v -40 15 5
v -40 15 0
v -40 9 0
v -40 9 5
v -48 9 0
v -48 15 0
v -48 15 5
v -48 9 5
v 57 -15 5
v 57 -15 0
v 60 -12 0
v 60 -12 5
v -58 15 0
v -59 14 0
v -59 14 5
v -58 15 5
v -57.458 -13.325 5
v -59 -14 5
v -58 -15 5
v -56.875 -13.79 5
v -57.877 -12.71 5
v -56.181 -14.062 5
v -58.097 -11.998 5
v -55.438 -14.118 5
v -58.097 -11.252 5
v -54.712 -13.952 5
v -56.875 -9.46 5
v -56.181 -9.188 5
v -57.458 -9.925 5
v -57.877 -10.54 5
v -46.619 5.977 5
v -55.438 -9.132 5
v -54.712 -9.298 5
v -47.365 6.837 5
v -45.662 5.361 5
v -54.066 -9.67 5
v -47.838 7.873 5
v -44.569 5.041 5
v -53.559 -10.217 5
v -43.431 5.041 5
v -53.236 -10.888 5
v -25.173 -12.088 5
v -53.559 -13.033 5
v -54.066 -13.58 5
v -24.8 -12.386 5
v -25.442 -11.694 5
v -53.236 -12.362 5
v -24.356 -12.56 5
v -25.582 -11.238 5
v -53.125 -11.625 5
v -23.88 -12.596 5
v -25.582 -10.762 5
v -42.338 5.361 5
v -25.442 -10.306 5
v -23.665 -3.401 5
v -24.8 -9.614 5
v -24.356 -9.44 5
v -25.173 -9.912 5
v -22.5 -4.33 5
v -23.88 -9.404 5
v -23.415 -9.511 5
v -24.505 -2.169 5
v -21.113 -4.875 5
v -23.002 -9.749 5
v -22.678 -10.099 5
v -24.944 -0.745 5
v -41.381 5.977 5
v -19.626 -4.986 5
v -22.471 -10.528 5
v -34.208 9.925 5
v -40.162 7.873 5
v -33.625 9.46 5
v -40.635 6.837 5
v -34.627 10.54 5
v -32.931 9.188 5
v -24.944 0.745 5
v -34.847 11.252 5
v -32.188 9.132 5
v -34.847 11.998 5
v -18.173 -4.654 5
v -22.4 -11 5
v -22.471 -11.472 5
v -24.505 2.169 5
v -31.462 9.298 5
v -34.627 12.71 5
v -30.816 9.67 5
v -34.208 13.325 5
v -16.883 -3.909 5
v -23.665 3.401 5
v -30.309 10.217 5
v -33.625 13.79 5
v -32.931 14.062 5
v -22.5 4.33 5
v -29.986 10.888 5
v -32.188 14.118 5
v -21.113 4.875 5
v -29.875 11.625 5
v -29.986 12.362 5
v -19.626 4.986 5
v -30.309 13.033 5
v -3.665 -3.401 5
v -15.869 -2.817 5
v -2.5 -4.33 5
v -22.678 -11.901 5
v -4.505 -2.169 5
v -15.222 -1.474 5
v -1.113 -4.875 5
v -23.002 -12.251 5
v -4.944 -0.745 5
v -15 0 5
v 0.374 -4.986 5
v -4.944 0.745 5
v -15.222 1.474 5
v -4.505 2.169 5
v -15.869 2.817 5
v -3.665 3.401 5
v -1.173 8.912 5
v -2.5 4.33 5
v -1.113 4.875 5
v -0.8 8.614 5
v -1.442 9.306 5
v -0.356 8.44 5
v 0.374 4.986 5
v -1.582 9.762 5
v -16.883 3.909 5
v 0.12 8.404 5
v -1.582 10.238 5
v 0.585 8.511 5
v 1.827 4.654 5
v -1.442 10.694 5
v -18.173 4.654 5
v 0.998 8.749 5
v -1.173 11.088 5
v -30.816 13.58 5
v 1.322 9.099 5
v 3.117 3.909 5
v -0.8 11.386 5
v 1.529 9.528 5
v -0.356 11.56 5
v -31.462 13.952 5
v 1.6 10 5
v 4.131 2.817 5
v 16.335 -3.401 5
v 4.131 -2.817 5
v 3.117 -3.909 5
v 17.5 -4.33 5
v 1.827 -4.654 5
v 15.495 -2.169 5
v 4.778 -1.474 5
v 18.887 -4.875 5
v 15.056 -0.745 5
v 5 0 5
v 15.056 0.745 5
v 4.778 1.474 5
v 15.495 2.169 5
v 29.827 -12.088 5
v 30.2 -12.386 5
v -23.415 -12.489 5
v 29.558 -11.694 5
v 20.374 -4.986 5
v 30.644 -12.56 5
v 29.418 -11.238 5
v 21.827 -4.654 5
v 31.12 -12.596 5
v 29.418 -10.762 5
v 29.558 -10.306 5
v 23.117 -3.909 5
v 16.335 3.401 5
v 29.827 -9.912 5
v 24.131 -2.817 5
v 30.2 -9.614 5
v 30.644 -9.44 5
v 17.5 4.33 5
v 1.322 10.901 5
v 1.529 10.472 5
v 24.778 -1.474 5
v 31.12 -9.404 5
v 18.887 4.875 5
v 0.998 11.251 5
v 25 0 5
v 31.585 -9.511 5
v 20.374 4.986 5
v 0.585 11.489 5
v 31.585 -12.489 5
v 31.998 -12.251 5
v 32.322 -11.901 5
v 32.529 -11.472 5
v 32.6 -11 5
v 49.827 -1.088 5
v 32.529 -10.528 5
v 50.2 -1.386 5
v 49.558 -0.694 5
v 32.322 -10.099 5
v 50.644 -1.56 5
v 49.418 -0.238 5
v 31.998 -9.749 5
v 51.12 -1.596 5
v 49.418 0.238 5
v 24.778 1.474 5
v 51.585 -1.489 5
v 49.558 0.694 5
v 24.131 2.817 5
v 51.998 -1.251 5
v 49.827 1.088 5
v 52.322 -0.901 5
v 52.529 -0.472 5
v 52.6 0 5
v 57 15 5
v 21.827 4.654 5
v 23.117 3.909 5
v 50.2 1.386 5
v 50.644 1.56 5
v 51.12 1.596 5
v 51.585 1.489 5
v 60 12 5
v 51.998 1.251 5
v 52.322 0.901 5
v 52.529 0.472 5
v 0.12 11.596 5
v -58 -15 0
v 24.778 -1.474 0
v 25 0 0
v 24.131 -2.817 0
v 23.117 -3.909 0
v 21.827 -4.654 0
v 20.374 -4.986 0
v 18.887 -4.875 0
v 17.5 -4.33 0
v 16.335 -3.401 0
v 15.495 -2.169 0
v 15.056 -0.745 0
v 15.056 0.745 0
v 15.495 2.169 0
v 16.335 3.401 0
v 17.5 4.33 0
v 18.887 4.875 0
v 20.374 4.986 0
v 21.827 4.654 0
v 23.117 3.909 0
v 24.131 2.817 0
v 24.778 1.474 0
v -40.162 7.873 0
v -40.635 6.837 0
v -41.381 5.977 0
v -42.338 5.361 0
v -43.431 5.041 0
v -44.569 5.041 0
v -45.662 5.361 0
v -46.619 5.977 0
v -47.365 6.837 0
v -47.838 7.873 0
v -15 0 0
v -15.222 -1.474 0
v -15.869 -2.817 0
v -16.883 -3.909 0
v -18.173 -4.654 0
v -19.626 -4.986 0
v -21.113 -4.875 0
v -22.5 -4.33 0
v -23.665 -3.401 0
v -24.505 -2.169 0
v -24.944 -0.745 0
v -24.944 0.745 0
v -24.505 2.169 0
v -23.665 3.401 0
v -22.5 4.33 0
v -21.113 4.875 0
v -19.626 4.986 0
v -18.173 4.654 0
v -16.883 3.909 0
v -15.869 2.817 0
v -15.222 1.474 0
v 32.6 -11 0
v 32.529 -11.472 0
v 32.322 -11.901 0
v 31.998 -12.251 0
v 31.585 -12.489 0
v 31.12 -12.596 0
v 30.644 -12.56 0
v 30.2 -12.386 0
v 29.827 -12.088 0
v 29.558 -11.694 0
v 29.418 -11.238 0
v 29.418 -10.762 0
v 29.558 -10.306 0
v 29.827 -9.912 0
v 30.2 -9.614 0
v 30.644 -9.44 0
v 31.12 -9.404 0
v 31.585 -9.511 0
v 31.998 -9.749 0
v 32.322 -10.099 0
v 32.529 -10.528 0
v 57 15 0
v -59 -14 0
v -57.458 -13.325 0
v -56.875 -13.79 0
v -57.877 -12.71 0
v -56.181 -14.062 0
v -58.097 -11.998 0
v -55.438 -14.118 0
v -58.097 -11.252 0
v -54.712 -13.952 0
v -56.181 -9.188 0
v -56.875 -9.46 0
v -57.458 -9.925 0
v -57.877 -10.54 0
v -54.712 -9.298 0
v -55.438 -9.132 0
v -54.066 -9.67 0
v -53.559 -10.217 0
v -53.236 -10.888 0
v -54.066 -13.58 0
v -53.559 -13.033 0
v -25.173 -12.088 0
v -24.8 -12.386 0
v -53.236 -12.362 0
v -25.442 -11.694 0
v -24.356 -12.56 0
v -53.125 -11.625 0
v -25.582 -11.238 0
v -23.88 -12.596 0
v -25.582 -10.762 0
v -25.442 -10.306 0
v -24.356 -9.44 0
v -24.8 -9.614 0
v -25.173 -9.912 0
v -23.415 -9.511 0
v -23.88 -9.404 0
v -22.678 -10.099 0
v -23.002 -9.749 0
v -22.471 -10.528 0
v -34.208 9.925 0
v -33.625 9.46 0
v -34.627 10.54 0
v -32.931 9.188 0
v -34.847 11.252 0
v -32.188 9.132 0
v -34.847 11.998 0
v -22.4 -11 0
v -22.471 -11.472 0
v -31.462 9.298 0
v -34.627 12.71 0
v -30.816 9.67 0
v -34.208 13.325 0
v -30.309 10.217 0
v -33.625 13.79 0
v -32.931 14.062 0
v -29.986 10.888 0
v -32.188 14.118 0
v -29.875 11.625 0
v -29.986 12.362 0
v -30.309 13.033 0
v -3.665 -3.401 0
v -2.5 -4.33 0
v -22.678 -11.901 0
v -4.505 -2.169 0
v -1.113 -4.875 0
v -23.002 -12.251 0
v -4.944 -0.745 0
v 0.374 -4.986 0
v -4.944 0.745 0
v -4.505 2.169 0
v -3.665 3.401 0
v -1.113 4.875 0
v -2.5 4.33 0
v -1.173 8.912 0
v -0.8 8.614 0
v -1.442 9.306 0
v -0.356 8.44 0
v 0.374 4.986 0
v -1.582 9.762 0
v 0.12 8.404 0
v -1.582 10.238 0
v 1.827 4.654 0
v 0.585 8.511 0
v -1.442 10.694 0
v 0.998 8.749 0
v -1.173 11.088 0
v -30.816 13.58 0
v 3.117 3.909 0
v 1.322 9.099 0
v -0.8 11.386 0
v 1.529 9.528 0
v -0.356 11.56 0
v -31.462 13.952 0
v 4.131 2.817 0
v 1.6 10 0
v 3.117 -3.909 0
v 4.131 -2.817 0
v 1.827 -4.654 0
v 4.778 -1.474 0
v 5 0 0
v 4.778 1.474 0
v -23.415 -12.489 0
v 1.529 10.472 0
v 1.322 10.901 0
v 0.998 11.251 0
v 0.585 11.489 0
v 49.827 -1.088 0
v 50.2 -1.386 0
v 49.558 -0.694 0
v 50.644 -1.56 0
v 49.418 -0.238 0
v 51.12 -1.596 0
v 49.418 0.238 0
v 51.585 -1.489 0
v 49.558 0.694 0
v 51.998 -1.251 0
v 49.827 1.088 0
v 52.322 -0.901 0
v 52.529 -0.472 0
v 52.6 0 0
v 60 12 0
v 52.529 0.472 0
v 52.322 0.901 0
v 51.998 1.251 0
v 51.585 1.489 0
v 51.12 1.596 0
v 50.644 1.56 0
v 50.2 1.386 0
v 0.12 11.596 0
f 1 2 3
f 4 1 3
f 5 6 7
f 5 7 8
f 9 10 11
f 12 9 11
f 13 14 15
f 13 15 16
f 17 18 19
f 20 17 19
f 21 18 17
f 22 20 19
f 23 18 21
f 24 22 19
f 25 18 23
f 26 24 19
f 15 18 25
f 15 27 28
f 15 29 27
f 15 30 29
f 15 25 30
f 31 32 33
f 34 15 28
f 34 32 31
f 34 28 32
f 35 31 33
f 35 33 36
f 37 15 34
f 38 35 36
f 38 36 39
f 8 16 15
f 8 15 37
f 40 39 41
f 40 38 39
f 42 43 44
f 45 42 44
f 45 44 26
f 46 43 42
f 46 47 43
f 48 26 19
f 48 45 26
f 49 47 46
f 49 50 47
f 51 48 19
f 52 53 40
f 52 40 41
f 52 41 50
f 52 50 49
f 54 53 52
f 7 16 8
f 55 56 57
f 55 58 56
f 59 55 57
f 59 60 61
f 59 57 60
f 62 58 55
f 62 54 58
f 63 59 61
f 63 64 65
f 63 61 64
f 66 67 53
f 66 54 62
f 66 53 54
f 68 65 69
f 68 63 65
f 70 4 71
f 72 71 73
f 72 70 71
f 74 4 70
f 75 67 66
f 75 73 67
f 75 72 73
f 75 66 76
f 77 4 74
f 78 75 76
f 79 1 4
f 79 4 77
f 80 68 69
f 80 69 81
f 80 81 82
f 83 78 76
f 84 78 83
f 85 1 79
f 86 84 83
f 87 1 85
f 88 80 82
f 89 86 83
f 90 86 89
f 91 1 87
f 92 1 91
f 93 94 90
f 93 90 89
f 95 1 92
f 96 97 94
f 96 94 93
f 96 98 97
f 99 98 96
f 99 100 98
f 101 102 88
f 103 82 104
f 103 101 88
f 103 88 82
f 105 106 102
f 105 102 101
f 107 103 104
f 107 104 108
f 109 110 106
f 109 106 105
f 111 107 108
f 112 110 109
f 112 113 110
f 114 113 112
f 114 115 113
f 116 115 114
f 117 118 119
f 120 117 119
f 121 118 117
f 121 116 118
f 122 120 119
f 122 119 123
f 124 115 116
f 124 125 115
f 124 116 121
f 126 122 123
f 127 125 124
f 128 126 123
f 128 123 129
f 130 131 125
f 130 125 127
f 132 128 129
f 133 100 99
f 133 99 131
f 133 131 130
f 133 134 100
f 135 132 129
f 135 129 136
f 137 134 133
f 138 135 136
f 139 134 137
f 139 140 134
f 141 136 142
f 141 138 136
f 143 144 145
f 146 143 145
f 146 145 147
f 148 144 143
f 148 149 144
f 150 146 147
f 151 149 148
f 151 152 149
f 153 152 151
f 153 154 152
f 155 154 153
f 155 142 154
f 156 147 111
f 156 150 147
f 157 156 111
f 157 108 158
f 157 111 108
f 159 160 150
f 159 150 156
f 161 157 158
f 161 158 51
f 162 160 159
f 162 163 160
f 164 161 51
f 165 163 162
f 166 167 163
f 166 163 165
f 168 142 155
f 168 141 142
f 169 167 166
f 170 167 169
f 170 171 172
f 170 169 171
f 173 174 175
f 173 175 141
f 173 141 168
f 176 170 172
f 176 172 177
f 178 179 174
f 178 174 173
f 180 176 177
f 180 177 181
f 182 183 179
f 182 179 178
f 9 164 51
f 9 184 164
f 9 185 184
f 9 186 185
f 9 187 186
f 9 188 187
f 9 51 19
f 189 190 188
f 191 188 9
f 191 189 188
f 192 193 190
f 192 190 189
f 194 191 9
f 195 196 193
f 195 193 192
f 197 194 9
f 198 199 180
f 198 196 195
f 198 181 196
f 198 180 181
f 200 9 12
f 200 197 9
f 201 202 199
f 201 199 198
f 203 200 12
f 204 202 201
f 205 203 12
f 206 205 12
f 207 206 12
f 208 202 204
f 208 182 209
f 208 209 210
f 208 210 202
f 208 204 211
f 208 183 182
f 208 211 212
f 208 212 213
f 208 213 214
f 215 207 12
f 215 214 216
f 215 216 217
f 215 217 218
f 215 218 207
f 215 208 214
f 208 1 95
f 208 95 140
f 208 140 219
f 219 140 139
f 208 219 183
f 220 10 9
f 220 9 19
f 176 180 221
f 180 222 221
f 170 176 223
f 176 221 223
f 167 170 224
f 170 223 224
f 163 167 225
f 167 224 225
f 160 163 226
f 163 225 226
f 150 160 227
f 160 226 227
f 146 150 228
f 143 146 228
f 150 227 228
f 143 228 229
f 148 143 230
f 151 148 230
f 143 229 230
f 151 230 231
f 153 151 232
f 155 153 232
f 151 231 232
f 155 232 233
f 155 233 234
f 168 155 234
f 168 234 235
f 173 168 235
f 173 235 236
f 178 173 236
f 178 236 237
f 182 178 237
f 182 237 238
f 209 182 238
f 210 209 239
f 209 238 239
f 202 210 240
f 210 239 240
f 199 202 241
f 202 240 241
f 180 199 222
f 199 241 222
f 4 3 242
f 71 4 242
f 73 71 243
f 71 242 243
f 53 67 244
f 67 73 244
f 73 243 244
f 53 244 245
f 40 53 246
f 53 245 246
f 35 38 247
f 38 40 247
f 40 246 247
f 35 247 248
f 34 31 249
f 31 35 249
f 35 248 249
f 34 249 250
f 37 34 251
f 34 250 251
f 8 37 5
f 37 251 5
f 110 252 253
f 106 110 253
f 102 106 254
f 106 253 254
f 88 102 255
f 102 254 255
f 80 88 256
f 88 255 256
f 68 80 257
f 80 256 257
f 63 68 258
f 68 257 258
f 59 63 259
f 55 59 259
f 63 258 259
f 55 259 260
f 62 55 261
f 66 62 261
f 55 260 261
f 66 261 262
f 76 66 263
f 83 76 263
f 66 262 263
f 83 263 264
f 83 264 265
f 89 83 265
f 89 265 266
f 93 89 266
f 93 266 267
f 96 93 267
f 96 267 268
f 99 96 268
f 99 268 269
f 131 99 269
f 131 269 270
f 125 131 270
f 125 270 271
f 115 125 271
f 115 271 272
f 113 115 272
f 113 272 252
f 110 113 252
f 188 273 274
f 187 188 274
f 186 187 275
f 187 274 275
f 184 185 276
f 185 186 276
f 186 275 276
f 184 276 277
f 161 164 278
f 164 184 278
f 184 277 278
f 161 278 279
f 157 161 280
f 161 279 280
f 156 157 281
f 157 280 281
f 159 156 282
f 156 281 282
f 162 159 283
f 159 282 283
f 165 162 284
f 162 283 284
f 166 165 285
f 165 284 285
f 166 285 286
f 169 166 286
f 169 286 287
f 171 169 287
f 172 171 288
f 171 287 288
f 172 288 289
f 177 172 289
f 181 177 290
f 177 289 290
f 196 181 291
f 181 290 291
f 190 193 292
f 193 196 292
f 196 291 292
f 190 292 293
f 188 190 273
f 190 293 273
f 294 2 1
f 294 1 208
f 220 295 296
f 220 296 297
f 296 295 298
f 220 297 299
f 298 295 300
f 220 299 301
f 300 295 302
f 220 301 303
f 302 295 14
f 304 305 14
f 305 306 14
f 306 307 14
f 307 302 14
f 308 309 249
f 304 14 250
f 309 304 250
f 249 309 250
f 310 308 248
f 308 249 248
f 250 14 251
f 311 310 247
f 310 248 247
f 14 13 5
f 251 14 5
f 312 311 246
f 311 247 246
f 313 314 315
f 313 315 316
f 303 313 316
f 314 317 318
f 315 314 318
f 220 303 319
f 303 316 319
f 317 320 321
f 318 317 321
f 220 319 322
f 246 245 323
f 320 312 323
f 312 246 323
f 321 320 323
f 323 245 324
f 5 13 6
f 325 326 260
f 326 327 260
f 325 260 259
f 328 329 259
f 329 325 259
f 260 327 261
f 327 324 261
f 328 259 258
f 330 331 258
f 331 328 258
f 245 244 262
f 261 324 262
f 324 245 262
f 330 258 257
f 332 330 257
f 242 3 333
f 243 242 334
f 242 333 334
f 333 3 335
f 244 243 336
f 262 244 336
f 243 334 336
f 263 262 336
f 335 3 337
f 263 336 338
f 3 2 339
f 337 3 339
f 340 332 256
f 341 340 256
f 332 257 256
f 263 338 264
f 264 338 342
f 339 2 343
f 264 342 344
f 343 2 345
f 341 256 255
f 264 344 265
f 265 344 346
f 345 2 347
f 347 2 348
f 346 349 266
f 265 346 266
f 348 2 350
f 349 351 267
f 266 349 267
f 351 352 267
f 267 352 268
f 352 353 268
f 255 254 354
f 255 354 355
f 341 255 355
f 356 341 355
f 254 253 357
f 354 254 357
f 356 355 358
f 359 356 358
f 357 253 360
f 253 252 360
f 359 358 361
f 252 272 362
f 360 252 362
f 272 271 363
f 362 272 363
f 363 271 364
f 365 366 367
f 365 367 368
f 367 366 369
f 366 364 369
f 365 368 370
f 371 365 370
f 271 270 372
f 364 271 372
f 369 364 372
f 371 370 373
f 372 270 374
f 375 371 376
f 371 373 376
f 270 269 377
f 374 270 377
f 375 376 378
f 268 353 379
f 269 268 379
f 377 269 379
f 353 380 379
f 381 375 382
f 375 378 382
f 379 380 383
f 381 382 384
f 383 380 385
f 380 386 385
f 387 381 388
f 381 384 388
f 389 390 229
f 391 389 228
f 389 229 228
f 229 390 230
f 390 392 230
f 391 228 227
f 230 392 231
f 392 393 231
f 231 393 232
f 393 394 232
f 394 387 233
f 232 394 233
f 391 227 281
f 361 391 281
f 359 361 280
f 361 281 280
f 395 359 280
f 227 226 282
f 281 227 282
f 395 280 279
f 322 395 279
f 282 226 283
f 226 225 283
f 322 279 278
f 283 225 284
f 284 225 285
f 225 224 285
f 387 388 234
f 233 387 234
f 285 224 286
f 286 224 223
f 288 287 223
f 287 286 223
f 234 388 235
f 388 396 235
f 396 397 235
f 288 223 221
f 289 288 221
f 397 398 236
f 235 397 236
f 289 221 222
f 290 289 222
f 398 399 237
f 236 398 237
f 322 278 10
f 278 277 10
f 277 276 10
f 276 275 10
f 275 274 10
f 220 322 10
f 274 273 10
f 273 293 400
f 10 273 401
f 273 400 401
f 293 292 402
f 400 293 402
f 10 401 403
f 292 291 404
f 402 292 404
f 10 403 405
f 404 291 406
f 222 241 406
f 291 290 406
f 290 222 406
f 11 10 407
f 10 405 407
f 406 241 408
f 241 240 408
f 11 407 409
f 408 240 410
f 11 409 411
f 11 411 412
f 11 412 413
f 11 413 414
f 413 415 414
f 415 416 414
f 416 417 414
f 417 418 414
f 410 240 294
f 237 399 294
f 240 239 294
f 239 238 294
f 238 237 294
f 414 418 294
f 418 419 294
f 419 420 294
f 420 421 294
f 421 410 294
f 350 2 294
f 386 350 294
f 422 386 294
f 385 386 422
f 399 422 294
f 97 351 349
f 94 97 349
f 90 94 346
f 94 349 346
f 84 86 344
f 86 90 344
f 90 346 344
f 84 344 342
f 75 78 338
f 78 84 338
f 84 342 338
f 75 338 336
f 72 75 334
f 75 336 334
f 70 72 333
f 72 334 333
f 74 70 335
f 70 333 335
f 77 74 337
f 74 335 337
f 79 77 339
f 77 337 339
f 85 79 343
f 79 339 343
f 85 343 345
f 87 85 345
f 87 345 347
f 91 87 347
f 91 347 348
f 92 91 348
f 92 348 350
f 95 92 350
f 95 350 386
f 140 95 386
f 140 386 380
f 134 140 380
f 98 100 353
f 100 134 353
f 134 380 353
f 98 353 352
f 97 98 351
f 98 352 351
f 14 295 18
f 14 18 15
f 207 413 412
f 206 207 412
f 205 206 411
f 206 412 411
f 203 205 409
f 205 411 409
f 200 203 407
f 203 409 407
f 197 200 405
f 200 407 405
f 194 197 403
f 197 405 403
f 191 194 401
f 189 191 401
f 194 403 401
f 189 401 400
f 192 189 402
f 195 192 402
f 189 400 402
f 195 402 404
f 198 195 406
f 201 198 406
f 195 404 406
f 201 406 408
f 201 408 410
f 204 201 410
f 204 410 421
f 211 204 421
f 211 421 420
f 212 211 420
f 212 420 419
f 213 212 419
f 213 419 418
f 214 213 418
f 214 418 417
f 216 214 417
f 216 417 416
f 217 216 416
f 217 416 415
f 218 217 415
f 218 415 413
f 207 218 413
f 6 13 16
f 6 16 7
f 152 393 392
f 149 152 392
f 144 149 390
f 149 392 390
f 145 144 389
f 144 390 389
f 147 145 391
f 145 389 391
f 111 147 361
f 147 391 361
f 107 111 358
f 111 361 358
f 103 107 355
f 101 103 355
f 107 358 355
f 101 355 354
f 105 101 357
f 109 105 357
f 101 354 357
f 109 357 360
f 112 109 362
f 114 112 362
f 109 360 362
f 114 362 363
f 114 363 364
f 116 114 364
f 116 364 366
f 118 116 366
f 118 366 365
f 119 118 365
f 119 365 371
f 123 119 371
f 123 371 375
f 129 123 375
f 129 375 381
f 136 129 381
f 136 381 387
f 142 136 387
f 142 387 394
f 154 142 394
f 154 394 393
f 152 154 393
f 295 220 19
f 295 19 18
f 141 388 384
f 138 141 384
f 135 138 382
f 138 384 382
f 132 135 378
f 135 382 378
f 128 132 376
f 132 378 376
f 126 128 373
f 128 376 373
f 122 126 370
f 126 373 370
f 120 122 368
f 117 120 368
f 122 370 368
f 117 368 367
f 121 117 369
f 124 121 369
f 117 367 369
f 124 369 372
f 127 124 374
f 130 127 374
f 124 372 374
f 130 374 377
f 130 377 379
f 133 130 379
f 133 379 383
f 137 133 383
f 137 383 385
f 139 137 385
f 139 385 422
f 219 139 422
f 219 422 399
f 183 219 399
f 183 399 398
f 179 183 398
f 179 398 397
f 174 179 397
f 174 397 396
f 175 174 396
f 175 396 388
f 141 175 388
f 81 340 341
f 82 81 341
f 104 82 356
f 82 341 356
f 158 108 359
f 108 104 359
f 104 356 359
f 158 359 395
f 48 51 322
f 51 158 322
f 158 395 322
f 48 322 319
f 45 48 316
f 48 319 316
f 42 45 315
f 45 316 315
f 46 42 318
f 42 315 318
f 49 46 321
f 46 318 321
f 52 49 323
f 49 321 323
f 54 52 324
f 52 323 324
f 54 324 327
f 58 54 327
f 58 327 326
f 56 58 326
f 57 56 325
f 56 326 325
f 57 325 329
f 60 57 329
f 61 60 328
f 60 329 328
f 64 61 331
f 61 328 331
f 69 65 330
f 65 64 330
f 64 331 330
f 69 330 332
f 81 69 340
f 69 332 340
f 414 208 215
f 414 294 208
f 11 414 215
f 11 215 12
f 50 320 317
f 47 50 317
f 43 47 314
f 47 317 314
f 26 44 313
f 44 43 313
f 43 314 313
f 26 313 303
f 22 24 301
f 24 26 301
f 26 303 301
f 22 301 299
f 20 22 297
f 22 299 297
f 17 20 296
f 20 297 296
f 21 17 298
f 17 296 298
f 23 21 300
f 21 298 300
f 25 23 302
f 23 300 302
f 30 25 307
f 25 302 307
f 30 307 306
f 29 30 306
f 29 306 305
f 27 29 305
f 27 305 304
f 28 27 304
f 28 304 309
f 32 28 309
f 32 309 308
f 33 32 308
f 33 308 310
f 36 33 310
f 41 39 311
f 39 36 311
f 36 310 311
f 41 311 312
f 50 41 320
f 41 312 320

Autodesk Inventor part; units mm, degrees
ref_plane "YZ Plane" through (0, 0, 0) normal (1, 0, 0) x (0, 1, 0)
ref_plane "XZ Plane" through (0, 0, 0) normal (0, 1, 0) x (-1, 0, 0)
ref_plane "XY Plane" through (0, 0, 0) normal (0, 0, 1) x (1, 0, 0)
sketch "Náčrt1" plane through (0, 0, 0) normal (0, 0, 1) x (1, 0, 0)
  line L0 (0, -21) -> (0, 21) projected
  line L1 (-82.8, 0) -> (83.8, 0) projected
  line L2 (57, -15) -> (-58, -15)
  line L3 (-59, -14) -> (-59, 14)
  line L4 (-58, 15) -> (57, 15)
  line L5 (60, 12) -> (60, -12)
  circle A0 centre (20, 0) radius 5
  circle A1 centre (-20, 0) radius 5
  circle A2 centre (-55.625, -11.625) radius 2.5
  circle A3 centre (-32.375, 11.625) radius 2.5
  circle A4 centre (-24, -11) radius 1.6
  circle A5 centre (0, 10) radius 1.6
  circle A6 centre (51, 0) radius 1.6
  circle A7 centre (31, -11) radius 1.6
  line L6 (6, -6) -> (6, 0)
  line L7 (1, 0) -> (1, -6)
  line L8 (-3.5, -6) -> (-3.5, 0)
  line L9 (-8.5, 0) -> (-8.5, -6)
  arc A8 (1, -6) -> (6, -6) centre (3.5, -6) ccw
  arc A9 (-8.5, -6) -> (-3.5, -6) centre (-6, -6) ccw
  line L10 (-58, -15) -> (-59, -14)
  line L11 (-59, 14) -> (-58, 15)
  line L12 (57, -15) -> (60, -12)
  line L13 (57, 15) -> (60, 12)
  circle A10 centre (0, 0) radius 5
  arc A11 (6, 0) -> (4.4286, 2.3212) centre (3.5, 0) ccw
  arc A12 (1, -4.899) -> (4.4286, 2.3212) centre (0, 0) ccw
  arc A13 (-4.5625, 2.0454) -> (-8.5, 0) centre (-6, 0) ccw
  arc A14 (4.4286, 2.3212) -> (-4.5625, 2.0454) centre (0, 0) ccw
  arc A15 (-3.5, -3.5707) -> (1, -4.899) centre (0, 0) ccw
  arc A16 (-4.5625, 2.0454) -> (-3.5, -3.5707) centre (0, 0) ccw
  arc A17 (1, -4.899) -> (4.4286, 2.3212) centre (0, 0) ccw
  line L14 (1, -4.899) -> (1, -6)
  line L15 (-3.5, -3.5707) -> (-3.5, -6)
  arc A18 (-3.5, 0) -> (-4.5625, 2.0454) centre (-6, 0) ccw
  arc A19 (4.4286, 2.3212) -> (1, 0) centre (3.5, 0) ccw
  line L16 (-48, 15) -> (-48, 9)
  line L17 (-40, 15) -> (-40, 9)
  arc A20 (-48, 9) -> (-40, 9) centre (-44, 9) ccw
  line L18 (-48, 15) -> (-40, 15)
  point P0 (60, -15)
  point P1 (-59, 15)
  point P2 (-59, -15)
  point P3 (60, 15)
  dimension "d0" = 30
  dimension "d1" = 119
  dimension "d2" = 10
  dimension "d3" = 40
  dimension "d5" = 5
  dimension "d6" = 3.375
  dimension "d7" = 3.375
  dimension "d8" = 3.375
  dimension "d9" = 26.625
  dimension "d10" = 40
  dimension "d11" = 35
  dimension "d12" = 4
  dimension "d13" = 3.2
  dimension "d14" = 59
  dimension "d15" = 5
  dimension "d16" = 9
  dimension "d17" = 29
  dimension "d18" = 5
  dimension "d19" = 4.5
  dimension "d21" = 50.5
  dimension "d22" = 6.5
  dimension "d23" = 1
  dimension "d24" = 1
  dimension "d25" = 1
  dimension "d26" = 1
  dimension "d27" = 3
  dimension "d28" = 3
  dimension "d29" = 3
  dimension "d30" = 3
  dimension "d33" = 10
  dimension "d34" = 8
  dimension "d35" = 10
  dimension "d36" = 15
extrude "Vysunutí1" add sketch "Náčrt1" along normal blind 5 contours L2 L10 L3 L1 A1 L9 A9 L8 A10 L0 | L0 A10 L7 A8 L6 L1 A0 A6 L5 L12 L2 | L8 A9 L9 L1 A10 | A10 L1 L6 A8 L7 | A10 A13 L1 A1 L3 L11 L4 L16 A20 L17 L0 A5 | L0 A5 L4 L13 L5 L1 A6 A0 A11 A10 | L1 A13 A10 | A10 A11 L1
equation "\"d7\" = d6"
equation "\"d8\" = d6"
equation "\"d24\" = d23"
equation "\"d25\" = d23"
equation "\"d26\" = d25"
equation "\"d28\" = d27"
equation "\"d29\" = d27"
equation "\"d30\" = d29"
